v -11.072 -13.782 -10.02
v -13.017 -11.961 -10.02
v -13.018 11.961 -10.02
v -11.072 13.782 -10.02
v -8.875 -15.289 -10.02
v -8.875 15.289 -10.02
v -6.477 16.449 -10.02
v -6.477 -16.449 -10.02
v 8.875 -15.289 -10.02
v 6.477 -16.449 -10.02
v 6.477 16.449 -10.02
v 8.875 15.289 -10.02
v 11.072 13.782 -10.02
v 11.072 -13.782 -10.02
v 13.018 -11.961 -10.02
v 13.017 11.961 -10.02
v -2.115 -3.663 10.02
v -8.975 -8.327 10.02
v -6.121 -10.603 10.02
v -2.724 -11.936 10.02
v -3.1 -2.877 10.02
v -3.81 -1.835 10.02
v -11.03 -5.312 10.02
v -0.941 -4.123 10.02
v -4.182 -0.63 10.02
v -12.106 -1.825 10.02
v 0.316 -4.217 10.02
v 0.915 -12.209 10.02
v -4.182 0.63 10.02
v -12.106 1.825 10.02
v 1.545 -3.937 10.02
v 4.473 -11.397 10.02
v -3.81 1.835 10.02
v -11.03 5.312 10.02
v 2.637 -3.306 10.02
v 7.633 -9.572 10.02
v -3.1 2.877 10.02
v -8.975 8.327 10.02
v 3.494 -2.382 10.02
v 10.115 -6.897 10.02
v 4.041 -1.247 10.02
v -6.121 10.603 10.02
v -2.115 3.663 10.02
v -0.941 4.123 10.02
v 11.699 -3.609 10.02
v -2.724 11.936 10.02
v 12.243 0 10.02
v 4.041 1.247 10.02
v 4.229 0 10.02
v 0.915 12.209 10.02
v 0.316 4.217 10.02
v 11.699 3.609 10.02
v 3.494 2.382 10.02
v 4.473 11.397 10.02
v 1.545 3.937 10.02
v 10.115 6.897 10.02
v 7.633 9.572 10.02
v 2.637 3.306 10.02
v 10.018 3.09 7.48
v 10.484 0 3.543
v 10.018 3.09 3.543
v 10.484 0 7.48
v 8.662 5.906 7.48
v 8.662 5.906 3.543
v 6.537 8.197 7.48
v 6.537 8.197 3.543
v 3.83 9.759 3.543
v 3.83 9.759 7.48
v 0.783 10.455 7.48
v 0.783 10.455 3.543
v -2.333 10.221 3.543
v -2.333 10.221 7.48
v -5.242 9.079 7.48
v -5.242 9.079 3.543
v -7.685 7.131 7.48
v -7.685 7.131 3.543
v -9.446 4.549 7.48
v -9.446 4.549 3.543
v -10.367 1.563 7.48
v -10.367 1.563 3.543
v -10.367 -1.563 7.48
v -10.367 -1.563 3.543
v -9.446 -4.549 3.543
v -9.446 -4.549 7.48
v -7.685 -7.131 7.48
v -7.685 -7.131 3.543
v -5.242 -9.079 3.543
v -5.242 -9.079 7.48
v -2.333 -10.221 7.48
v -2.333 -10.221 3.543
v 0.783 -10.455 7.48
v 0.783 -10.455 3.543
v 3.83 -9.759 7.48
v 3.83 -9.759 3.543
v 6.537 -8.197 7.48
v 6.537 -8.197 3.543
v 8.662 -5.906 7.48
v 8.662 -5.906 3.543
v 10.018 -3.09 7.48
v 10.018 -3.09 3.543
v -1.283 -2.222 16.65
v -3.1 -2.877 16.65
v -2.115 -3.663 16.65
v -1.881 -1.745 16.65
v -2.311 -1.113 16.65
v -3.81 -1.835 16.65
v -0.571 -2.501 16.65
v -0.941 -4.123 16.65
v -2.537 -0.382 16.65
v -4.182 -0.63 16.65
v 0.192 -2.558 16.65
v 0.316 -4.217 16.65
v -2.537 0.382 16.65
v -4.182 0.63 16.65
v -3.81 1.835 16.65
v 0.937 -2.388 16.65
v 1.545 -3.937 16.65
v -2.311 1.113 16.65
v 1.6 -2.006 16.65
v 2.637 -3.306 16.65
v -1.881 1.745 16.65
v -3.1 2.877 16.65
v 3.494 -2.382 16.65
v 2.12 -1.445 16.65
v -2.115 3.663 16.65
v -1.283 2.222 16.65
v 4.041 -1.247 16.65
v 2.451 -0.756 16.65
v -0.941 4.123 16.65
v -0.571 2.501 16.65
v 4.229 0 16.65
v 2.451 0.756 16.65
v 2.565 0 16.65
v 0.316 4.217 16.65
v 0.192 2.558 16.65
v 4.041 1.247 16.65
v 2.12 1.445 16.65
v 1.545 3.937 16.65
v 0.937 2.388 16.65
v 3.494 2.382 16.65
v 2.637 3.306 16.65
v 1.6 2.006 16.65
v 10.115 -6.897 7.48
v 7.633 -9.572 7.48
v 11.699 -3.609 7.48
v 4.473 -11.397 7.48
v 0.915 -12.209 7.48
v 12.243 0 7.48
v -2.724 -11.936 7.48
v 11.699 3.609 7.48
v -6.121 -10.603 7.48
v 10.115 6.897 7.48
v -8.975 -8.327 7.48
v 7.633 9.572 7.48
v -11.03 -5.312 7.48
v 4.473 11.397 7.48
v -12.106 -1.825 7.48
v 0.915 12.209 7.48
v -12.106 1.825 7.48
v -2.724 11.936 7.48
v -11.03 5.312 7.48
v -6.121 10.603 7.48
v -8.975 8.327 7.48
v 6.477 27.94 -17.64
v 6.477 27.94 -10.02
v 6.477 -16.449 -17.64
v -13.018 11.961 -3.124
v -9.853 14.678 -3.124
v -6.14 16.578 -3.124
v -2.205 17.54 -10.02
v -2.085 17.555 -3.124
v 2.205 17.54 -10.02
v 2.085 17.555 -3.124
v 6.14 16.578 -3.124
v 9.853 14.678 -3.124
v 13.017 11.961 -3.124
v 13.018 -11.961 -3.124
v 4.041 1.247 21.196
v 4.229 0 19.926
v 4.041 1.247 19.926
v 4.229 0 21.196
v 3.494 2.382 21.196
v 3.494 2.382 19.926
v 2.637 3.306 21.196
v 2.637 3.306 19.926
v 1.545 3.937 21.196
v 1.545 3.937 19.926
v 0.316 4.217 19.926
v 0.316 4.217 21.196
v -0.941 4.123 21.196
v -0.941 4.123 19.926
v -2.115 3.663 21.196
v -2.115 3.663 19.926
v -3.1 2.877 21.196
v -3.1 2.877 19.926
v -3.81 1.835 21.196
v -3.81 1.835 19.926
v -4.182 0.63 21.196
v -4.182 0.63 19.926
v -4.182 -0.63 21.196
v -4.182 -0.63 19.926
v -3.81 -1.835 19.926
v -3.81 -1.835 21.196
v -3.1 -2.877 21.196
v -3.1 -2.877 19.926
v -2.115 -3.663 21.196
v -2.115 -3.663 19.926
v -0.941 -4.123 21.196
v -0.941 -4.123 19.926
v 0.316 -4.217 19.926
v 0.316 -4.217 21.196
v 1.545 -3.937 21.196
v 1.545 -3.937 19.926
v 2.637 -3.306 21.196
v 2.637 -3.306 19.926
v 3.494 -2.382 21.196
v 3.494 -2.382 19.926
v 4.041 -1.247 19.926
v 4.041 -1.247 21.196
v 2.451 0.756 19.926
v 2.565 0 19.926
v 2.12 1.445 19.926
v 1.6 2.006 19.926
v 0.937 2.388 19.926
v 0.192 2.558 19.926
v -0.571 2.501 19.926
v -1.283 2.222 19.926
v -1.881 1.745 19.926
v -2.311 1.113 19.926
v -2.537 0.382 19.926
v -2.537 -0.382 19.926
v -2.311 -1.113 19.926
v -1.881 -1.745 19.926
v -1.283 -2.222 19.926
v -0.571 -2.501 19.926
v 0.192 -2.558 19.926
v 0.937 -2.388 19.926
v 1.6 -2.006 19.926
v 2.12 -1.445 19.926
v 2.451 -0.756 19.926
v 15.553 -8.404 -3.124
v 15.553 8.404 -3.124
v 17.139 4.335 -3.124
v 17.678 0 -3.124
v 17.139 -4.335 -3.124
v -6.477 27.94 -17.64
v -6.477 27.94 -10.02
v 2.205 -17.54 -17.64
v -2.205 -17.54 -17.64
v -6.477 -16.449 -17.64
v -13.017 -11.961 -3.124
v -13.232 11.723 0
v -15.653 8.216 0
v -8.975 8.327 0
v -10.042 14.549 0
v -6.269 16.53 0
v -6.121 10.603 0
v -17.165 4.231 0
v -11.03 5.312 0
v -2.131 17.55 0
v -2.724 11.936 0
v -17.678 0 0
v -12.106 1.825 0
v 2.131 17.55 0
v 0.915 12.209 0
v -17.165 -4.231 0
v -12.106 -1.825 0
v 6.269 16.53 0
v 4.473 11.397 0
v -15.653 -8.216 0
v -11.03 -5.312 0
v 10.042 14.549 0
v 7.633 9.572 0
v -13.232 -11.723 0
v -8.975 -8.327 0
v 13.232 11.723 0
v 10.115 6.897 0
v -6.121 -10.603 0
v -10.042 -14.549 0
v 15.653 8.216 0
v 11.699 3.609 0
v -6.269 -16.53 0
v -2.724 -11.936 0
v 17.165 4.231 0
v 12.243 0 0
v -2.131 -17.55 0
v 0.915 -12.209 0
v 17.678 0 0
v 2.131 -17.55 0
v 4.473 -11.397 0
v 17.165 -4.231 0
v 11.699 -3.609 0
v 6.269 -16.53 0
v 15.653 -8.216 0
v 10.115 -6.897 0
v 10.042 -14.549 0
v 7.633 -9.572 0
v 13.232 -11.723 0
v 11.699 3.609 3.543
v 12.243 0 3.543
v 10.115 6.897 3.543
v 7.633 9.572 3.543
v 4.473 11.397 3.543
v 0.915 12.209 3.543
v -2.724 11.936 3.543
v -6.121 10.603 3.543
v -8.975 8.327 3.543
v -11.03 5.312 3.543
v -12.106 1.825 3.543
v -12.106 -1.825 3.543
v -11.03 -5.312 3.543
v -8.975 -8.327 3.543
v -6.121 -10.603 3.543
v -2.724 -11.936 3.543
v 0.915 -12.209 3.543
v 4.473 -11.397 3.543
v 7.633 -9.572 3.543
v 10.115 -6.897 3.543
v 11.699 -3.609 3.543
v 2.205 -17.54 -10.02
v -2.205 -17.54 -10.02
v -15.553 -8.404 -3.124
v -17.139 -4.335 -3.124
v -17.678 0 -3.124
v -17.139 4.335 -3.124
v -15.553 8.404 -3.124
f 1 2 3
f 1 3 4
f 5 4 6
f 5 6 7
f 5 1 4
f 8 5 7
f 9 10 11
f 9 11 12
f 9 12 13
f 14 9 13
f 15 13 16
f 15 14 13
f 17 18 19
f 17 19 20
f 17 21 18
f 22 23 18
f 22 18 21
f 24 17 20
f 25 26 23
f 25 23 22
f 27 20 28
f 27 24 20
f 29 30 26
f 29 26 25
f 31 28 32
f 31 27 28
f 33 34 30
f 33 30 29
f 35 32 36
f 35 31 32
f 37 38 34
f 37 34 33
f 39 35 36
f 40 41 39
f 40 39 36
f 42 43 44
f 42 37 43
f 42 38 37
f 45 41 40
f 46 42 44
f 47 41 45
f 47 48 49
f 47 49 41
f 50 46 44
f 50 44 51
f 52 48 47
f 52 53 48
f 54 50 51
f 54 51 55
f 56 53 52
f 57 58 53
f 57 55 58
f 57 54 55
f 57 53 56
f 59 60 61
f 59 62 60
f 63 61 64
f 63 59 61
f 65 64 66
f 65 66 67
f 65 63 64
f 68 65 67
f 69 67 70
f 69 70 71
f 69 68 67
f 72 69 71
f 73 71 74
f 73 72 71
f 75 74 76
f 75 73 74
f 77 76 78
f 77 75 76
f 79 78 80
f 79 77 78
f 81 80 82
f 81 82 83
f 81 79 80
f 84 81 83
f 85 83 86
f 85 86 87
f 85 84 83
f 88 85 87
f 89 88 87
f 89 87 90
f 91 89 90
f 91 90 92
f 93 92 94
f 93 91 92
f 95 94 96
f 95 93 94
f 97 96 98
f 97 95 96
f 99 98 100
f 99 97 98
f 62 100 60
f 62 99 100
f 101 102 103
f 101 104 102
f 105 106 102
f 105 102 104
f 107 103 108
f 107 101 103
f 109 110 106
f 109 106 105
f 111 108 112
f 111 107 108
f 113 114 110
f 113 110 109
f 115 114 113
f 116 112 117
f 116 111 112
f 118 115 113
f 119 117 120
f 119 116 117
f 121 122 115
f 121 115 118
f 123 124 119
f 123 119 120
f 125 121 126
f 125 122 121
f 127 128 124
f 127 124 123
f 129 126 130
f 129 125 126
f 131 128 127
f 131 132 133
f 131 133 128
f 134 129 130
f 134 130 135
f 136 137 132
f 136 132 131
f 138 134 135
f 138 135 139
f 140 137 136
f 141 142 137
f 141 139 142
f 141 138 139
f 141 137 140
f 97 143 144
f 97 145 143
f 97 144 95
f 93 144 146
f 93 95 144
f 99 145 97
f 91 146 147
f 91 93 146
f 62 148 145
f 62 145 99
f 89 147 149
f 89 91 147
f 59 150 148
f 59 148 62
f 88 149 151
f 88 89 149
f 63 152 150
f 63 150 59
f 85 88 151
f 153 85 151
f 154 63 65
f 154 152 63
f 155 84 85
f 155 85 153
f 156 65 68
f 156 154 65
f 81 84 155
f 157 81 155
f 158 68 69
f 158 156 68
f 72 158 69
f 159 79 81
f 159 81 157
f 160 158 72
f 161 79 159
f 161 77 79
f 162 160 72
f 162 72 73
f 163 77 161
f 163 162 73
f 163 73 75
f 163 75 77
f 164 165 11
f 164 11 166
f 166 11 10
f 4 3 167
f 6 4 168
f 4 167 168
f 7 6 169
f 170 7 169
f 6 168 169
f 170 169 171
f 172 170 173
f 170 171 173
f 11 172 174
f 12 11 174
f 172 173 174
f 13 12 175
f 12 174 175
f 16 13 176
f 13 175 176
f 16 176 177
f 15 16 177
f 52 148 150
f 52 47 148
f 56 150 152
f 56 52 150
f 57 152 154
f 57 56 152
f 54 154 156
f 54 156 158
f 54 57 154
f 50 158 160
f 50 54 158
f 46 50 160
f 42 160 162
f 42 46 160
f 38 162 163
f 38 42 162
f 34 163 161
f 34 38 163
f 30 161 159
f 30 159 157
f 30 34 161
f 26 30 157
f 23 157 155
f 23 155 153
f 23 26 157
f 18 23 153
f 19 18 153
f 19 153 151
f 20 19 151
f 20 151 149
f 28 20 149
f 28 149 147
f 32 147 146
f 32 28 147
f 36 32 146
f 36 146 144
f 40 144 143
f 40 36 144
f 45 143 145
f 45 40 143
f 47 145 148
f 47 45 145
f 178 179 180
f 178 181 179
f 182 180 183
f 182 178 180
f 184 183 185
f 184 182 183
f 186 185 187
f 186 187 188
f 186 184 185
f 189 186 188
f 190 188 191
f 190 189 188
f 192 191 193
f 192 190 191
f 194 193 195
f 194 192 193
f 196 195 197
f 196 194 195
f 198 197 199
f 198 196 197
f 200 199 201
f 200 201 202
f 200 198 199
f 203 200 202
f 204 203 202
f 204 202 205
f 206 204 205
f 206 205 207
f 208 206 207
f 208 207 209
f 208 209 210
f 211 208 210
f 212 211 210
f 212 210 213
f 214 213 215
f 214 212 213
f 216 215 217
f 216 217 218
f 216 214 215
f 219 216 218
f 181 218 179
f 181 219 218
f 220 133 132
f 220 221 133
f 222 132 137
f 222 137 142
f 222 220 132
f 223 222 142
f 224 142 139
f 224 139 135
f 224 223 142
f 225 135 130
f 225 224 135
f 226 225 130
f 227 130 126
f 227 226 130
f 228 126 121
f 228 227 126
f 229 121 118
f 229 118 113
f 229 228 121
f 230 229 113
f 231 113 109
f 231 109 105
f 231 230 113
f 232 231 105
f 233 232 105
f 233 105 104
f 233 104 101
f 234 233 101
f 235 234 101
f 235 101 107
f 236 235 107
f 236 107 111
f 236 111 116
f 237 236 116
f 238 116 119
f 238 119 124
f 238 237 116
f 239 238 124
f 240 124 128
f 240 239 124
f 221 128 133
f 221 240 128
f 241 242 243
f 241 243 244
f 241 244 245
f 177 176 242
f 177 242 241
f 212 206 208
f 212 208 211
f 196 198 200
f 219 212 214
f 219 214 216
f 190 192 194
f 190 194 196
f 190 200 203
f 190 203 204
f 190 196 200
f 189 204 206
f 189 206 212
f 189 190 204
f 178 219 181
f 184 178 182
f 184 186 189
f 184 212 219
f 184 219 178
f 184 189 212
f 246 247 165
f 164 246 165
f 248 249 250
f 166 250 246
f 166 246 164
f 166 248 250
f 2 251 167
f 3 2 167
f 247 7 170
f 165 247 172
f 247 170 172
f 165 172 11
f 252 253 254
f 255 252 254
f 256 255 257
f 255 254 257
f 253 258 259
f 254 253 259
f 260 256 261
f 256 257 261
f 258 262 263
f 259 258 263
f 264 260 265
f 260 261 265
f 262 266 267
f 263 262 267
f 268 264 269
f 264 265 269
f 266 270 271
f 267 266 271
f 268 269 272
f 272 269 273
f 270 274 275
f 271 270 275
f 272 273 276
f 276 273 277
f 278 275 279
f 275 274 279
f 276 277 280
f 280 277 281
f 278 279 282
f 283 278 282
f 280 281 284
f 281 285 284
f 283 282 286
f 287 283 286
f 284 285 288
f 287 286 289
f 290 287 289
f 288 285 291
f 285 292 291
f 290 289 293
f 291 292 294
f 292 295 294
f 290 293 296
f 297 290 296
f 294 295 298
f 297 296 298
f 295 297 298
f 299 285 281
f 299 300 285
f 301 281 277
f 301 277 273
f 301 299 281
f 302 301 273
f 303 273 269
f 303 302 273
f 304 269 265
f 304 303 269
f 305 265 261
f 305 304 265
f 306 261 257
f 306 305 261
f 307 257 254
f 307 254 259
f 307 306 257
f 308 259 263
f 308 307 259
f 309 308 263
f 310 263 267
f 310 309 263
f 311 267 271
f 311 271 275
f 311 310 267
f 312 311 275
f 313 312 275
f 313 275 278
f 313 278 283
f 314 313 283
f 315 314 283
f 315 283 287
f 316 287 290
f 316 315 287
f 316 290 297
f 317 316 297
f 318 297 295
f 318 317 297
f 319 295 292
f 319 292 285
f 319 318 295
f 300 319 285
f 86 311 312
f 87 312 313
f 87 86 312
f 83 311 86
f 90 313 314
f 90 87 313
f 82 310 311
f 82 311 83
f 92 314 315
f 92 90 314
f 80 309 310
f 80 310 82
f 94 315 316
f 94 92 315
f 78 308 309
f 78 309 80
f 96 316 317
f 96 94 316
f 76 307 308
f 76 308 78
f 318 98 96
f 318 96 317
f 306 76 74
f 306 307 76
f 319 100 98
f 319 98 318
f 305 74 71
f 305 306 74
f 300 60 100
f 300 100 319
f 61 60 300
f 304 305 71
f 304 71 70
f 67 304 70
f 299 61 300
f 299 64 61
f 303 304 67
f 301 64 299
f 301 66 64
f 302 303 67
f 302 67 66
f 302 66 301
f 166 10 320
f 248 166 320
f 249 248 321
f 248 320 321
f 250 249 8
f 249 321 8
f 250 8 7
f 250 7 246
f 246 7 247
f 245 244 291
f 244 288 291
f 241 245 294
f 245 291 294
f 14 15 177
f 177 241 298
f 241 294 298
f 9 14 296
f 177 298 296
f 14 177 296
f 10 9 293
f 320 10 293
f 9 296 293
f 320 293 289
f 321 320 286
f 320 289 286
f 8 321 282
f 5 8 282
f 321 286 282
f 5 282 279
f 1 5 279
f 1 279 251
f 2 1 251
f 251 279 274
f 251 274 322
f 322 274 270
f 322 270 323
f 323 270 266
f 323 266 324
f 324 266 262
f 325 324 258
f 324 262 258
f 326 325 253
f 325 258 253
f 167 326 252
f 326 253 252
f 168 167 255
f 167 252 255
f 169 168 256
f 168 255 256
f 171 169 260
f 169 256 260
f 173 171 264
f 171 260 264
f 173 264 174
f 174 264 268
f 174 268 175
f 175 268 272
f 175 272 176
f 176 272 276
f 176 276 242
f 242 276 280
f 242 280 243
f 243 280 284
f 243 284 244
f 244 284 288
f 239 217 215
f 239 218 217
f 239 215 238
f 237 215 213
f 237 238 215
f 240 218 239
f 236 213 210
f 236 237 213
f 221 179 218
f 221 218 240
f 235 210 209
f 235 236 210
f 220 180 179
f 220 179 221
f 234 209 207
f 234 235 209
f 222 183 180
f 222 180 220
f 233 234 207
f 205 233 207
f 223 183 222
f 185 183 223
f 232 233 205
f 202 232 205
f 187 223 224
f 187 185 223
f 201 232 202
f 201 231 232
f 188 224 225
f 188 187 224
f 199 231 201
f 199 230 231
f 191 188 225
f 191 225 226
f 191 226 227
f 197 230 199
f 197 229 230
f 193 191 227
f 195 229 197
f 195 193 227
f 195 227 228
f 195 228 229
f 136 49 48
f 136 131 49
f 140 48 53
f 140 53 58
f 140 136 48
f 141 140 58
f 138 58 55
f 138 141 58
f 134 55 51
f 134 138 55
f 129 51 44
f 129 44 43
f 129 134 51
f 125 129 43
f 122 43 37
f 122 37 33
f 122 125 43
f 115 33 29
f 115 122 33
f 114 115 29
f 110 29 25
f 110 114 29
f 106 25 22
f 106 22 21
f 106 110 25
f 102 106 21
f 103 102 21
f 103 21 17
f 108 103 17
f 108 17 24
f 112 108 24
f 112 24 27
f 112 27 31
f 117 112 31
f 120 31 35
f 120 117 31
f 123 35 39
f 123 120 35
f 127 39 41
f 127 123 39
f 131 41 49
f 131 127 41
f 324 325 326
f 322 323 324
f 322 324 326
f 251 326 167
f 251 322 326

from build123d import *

# Parameters (mm, degrees)
F2_R     = 17.6784
F3_DEPTH = 3.1242
F5_DEPTH = 6.8961
F7_DEPTH = 7.62


with BuildPart() as f1:
    # F0 (on Front) → F1 (revolve)
    with BuildSketch(Plane.XZ):
        Polygon((0, 21.1963), (0, 0), (12.2428, 0), (12.2428, 3.5433), (10.48385, 3.5433), (10.48385, 7.4803), (12.2428, 7.4803), (12.2428, 10.0203), (4.2291, 10.0203), (4.2291, 16.6497), (2.5654, 16.6497), (2.5654, 19.9263), (4.2291, 19.9263), (4.2291, 21.1963), align=None)
    revolve(axis=Axis((0, 0, 10.59815), (0, 0, 1)))

    # F2 (on face) → F3 (join)
    with BuildSketch(Plane(origin=(0, 0, 0), x_dir=(1, 0, 0), z_dir=(0, 0, -1))):
        Circle(F2_R)
    extrude(amount=F3_DEPTH)

    # F4 (on face) → F5 (join)
    with BuildSketch(Plane(origin=(0, 0, -3.1242), x_dir=(1, 0, 0), z_dir=(0, 0, -1))):
        with BuildLine():
            Line((-13.0175, 11.961209), (-13.0175, -11.961209))
            ThreePointArc((-13.0175, -11.961209), (0, -17.6784), (13.0175, -11.961209))
            Line((13.0175, -11.961209), (13.0175, 11.961209))
            ThreePointArc((13.0175, 11.961209), (0, 17.6784), (-13.0175, 11.961209))
        make_face()
    extrude(amount=F5_DEPTH)

    # F6 (on face) → F7 (join)
    with BuildSketch(Plane(origin=(0, 0, -10.0203), x_dir=(1, 0, 0), z_dir=(0, 0, -1))):
        with BuildLine():
            ThreePointArc((-6.477, -16.449143), (0, -17.6784), (6.477, -16.449143))
            Line((6.477, -16.449143), (6.477, 16.449143))
            ThreePointArc((6.477, 16.449143), (0, 17.6784), (-6.477, 16.449143))
            Line((-6.477, 16.449143), (-6.477, -16.449143))
        make_face()
        with BuildLine():
            Line((-6.477, -27.94), (6.477, -27.94))
            Line((6.477, -27.94), (6.477, -16.449143))
            ThreePointArc((6.477, -16.449143), (0, -17.6784), (-6.477, -16.449143))
            Line((-6.477, -16.449143), (-6.477, -27.94))
        make_face()
    extrude(amount=F7_DEPTH)


solid = f1.part
